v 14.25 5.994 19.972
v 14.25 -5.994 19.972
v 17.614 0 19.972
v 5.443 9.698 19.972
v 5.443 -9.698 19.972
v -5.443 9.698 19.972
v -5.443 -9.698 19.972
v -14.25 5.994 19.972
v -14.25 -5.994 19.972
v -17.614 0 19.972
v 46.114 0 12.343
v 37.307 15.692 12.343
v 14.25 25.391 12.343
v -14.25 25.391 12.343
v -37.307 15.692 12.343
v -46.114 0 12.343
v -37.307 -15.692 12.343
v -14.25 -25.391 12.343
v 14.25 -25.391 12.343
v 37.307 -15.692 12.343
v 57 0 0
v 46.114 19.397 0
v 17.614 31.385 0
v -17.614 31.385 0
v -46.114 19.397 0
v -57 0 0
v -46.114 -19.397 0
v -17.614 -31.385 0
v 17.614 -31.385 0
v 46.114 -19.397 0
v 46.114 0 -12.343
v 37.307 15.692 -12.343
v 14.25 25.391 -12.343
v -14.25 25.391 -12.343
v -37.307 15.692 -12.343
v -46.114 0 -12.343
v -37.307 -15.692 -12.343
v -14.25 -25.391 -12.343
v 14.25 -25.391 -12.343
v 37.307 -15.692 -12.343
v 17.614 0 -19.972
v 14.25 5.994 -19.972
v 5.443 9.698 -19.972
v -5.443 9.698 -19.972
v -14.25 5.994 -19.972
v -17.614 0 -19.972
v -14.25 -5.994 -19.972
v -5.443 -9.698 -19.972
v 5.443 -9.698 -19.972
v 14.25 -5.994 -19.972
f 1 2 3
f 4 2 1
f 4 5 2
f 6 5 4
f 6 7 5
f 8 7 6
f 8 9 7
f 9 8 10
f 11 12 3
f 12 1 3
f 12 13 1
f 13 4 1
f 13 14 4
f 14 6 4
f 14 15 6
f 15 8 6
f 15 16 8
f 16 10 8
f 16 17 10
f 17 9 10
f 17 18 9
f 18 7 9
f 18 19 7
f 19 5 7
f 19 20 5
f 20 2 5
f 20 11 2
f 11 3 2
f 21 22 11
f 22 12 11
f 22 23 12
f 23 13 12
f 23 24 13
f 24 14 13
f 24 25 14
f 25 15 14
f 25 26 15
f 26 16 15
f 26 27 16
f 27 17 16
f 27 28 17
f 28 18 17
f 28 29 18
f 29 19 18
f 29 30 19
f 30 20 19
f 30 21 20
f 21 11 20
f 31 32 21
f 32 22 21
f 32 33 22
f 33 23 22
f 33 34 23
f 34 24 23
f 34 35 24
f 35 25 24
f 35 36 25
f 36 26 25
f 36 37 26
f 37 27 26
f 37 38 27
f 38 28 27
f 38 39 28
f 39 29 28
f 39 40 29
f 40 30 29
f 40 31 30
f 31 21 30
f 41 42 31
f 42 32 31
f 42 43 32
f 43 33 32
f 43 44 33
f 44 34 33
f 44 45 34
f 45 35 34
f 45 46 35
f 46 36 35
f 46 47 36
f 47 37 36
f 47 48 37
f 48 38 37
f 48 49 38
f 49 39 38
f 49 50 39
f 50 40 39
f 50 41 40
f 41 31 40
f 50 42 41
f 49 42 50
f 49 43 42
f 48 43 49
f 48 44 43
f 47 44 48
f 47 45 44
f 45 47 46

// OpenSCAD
// Generated by SolidPython 1.0.1 on 2020-07-29 00:46:54


scale(v = [19, 11, 7]) {
	sphere(r = 3);
}
/***********************************************
*********      SolidPython code:      **********
************************************************
 
# import packages: SolidPython
from solid import *
from solid.utils import *
from itertools import chain, combinations, permutations


class Resize:

    def __init__(self, scad_file):
        self.scad_file = scad_file
        #self.scad_file = import_scad(scad_file)
        # cone/cylinder param:
        self.r1 = 0
        self.r2 = 0
        self.h = 0
        # rectangular prism param:
        self.w = 0
        self.l = 0
        # ellipse param:
        self.r = 0

    # import OpenScad code (file name corresponds to shape)


    # classify shape + parameters
    def assign(self, param1, param2, param3):
        if self.scad_file == 'cone.scad':
            self.r1 = param1
            self.r2 = param2
            self.h = param3
        elif self.scad_file == 'cylinder.scad':
            self.r1 = param1
            self.r2 = param2
            self.h = param3
        elif self.scad_file == 'rectangularPrism.scad':
            self.h = param1
            self.l = param2
            self.w = param3
        else:
            self.r = param1
            self.h = param2

    # resize parameters
    def iterate(self):
        x = range(3, 20, 2)
        i = 1
        if self.scad_file == 'cone.scad':
            tempList = list(permutations(x, 2))
            for temp in tempList:
                param1 = temp[0]
                param2 = temp[1]
                filepath = 'produced_scad_files/' + 'cone' + str(param1) + '_' + str(param2) + '_' + '.scad'
                scad_render_to_file(cylinder(h=param1, r1=param2, r2=0), filepath)

        elif self.scad_file == 'cylinder.scad':
            tempList = list(permutations(x, 3))
            for temp in tempList:
                param1 = temp[0]
                param2 = temp[1]
                filepath = 'produced_scad_files/' + 'cylinder' + str(param1) + '_' + str(param2) + '_' + '.scad'
                scad_render_to_file(cylinder(h=param1, r1=param2, r2=param2), filepath)

        elif self.scad_file == 'rectangularPrism.scad':
            tempList = list(permutations(x, 3))
            for temp in tempList:
                param1 = temp[0]
                param2 = temp[1]
                param3 = temp[2]
                filepath = 'produced_scad_files/' + 'rectangularPrism' + str(param1) + '_' + str(param2) + '_' + str(
                    param3) + '.scad'
                scad_render_to_file(cube(size=(param1, param2, param3)), filepath)

        elif self.scad_file == 'ellipse.scad':
            tempList = list(permutations(x, 4))
            for temp in tempList:
                param1 = temp[0]
                param2 = temp[1]
                param3 = temp[2]
                param4 = temp[3]
                filepath = 'produced_scad_files/' + 'ellipse' + str(param1) + '_' + str(param2) + '_' + str(param3) + '_' + str(param4) + '.scad'
                scad_render_to_file(scale([param1, param2, param3])(sphere(r=param4)), filepath)

    def render_to_scadfile(self):
        scad_render_to_file(scad, 'example.scad') 
 
************************************************/
